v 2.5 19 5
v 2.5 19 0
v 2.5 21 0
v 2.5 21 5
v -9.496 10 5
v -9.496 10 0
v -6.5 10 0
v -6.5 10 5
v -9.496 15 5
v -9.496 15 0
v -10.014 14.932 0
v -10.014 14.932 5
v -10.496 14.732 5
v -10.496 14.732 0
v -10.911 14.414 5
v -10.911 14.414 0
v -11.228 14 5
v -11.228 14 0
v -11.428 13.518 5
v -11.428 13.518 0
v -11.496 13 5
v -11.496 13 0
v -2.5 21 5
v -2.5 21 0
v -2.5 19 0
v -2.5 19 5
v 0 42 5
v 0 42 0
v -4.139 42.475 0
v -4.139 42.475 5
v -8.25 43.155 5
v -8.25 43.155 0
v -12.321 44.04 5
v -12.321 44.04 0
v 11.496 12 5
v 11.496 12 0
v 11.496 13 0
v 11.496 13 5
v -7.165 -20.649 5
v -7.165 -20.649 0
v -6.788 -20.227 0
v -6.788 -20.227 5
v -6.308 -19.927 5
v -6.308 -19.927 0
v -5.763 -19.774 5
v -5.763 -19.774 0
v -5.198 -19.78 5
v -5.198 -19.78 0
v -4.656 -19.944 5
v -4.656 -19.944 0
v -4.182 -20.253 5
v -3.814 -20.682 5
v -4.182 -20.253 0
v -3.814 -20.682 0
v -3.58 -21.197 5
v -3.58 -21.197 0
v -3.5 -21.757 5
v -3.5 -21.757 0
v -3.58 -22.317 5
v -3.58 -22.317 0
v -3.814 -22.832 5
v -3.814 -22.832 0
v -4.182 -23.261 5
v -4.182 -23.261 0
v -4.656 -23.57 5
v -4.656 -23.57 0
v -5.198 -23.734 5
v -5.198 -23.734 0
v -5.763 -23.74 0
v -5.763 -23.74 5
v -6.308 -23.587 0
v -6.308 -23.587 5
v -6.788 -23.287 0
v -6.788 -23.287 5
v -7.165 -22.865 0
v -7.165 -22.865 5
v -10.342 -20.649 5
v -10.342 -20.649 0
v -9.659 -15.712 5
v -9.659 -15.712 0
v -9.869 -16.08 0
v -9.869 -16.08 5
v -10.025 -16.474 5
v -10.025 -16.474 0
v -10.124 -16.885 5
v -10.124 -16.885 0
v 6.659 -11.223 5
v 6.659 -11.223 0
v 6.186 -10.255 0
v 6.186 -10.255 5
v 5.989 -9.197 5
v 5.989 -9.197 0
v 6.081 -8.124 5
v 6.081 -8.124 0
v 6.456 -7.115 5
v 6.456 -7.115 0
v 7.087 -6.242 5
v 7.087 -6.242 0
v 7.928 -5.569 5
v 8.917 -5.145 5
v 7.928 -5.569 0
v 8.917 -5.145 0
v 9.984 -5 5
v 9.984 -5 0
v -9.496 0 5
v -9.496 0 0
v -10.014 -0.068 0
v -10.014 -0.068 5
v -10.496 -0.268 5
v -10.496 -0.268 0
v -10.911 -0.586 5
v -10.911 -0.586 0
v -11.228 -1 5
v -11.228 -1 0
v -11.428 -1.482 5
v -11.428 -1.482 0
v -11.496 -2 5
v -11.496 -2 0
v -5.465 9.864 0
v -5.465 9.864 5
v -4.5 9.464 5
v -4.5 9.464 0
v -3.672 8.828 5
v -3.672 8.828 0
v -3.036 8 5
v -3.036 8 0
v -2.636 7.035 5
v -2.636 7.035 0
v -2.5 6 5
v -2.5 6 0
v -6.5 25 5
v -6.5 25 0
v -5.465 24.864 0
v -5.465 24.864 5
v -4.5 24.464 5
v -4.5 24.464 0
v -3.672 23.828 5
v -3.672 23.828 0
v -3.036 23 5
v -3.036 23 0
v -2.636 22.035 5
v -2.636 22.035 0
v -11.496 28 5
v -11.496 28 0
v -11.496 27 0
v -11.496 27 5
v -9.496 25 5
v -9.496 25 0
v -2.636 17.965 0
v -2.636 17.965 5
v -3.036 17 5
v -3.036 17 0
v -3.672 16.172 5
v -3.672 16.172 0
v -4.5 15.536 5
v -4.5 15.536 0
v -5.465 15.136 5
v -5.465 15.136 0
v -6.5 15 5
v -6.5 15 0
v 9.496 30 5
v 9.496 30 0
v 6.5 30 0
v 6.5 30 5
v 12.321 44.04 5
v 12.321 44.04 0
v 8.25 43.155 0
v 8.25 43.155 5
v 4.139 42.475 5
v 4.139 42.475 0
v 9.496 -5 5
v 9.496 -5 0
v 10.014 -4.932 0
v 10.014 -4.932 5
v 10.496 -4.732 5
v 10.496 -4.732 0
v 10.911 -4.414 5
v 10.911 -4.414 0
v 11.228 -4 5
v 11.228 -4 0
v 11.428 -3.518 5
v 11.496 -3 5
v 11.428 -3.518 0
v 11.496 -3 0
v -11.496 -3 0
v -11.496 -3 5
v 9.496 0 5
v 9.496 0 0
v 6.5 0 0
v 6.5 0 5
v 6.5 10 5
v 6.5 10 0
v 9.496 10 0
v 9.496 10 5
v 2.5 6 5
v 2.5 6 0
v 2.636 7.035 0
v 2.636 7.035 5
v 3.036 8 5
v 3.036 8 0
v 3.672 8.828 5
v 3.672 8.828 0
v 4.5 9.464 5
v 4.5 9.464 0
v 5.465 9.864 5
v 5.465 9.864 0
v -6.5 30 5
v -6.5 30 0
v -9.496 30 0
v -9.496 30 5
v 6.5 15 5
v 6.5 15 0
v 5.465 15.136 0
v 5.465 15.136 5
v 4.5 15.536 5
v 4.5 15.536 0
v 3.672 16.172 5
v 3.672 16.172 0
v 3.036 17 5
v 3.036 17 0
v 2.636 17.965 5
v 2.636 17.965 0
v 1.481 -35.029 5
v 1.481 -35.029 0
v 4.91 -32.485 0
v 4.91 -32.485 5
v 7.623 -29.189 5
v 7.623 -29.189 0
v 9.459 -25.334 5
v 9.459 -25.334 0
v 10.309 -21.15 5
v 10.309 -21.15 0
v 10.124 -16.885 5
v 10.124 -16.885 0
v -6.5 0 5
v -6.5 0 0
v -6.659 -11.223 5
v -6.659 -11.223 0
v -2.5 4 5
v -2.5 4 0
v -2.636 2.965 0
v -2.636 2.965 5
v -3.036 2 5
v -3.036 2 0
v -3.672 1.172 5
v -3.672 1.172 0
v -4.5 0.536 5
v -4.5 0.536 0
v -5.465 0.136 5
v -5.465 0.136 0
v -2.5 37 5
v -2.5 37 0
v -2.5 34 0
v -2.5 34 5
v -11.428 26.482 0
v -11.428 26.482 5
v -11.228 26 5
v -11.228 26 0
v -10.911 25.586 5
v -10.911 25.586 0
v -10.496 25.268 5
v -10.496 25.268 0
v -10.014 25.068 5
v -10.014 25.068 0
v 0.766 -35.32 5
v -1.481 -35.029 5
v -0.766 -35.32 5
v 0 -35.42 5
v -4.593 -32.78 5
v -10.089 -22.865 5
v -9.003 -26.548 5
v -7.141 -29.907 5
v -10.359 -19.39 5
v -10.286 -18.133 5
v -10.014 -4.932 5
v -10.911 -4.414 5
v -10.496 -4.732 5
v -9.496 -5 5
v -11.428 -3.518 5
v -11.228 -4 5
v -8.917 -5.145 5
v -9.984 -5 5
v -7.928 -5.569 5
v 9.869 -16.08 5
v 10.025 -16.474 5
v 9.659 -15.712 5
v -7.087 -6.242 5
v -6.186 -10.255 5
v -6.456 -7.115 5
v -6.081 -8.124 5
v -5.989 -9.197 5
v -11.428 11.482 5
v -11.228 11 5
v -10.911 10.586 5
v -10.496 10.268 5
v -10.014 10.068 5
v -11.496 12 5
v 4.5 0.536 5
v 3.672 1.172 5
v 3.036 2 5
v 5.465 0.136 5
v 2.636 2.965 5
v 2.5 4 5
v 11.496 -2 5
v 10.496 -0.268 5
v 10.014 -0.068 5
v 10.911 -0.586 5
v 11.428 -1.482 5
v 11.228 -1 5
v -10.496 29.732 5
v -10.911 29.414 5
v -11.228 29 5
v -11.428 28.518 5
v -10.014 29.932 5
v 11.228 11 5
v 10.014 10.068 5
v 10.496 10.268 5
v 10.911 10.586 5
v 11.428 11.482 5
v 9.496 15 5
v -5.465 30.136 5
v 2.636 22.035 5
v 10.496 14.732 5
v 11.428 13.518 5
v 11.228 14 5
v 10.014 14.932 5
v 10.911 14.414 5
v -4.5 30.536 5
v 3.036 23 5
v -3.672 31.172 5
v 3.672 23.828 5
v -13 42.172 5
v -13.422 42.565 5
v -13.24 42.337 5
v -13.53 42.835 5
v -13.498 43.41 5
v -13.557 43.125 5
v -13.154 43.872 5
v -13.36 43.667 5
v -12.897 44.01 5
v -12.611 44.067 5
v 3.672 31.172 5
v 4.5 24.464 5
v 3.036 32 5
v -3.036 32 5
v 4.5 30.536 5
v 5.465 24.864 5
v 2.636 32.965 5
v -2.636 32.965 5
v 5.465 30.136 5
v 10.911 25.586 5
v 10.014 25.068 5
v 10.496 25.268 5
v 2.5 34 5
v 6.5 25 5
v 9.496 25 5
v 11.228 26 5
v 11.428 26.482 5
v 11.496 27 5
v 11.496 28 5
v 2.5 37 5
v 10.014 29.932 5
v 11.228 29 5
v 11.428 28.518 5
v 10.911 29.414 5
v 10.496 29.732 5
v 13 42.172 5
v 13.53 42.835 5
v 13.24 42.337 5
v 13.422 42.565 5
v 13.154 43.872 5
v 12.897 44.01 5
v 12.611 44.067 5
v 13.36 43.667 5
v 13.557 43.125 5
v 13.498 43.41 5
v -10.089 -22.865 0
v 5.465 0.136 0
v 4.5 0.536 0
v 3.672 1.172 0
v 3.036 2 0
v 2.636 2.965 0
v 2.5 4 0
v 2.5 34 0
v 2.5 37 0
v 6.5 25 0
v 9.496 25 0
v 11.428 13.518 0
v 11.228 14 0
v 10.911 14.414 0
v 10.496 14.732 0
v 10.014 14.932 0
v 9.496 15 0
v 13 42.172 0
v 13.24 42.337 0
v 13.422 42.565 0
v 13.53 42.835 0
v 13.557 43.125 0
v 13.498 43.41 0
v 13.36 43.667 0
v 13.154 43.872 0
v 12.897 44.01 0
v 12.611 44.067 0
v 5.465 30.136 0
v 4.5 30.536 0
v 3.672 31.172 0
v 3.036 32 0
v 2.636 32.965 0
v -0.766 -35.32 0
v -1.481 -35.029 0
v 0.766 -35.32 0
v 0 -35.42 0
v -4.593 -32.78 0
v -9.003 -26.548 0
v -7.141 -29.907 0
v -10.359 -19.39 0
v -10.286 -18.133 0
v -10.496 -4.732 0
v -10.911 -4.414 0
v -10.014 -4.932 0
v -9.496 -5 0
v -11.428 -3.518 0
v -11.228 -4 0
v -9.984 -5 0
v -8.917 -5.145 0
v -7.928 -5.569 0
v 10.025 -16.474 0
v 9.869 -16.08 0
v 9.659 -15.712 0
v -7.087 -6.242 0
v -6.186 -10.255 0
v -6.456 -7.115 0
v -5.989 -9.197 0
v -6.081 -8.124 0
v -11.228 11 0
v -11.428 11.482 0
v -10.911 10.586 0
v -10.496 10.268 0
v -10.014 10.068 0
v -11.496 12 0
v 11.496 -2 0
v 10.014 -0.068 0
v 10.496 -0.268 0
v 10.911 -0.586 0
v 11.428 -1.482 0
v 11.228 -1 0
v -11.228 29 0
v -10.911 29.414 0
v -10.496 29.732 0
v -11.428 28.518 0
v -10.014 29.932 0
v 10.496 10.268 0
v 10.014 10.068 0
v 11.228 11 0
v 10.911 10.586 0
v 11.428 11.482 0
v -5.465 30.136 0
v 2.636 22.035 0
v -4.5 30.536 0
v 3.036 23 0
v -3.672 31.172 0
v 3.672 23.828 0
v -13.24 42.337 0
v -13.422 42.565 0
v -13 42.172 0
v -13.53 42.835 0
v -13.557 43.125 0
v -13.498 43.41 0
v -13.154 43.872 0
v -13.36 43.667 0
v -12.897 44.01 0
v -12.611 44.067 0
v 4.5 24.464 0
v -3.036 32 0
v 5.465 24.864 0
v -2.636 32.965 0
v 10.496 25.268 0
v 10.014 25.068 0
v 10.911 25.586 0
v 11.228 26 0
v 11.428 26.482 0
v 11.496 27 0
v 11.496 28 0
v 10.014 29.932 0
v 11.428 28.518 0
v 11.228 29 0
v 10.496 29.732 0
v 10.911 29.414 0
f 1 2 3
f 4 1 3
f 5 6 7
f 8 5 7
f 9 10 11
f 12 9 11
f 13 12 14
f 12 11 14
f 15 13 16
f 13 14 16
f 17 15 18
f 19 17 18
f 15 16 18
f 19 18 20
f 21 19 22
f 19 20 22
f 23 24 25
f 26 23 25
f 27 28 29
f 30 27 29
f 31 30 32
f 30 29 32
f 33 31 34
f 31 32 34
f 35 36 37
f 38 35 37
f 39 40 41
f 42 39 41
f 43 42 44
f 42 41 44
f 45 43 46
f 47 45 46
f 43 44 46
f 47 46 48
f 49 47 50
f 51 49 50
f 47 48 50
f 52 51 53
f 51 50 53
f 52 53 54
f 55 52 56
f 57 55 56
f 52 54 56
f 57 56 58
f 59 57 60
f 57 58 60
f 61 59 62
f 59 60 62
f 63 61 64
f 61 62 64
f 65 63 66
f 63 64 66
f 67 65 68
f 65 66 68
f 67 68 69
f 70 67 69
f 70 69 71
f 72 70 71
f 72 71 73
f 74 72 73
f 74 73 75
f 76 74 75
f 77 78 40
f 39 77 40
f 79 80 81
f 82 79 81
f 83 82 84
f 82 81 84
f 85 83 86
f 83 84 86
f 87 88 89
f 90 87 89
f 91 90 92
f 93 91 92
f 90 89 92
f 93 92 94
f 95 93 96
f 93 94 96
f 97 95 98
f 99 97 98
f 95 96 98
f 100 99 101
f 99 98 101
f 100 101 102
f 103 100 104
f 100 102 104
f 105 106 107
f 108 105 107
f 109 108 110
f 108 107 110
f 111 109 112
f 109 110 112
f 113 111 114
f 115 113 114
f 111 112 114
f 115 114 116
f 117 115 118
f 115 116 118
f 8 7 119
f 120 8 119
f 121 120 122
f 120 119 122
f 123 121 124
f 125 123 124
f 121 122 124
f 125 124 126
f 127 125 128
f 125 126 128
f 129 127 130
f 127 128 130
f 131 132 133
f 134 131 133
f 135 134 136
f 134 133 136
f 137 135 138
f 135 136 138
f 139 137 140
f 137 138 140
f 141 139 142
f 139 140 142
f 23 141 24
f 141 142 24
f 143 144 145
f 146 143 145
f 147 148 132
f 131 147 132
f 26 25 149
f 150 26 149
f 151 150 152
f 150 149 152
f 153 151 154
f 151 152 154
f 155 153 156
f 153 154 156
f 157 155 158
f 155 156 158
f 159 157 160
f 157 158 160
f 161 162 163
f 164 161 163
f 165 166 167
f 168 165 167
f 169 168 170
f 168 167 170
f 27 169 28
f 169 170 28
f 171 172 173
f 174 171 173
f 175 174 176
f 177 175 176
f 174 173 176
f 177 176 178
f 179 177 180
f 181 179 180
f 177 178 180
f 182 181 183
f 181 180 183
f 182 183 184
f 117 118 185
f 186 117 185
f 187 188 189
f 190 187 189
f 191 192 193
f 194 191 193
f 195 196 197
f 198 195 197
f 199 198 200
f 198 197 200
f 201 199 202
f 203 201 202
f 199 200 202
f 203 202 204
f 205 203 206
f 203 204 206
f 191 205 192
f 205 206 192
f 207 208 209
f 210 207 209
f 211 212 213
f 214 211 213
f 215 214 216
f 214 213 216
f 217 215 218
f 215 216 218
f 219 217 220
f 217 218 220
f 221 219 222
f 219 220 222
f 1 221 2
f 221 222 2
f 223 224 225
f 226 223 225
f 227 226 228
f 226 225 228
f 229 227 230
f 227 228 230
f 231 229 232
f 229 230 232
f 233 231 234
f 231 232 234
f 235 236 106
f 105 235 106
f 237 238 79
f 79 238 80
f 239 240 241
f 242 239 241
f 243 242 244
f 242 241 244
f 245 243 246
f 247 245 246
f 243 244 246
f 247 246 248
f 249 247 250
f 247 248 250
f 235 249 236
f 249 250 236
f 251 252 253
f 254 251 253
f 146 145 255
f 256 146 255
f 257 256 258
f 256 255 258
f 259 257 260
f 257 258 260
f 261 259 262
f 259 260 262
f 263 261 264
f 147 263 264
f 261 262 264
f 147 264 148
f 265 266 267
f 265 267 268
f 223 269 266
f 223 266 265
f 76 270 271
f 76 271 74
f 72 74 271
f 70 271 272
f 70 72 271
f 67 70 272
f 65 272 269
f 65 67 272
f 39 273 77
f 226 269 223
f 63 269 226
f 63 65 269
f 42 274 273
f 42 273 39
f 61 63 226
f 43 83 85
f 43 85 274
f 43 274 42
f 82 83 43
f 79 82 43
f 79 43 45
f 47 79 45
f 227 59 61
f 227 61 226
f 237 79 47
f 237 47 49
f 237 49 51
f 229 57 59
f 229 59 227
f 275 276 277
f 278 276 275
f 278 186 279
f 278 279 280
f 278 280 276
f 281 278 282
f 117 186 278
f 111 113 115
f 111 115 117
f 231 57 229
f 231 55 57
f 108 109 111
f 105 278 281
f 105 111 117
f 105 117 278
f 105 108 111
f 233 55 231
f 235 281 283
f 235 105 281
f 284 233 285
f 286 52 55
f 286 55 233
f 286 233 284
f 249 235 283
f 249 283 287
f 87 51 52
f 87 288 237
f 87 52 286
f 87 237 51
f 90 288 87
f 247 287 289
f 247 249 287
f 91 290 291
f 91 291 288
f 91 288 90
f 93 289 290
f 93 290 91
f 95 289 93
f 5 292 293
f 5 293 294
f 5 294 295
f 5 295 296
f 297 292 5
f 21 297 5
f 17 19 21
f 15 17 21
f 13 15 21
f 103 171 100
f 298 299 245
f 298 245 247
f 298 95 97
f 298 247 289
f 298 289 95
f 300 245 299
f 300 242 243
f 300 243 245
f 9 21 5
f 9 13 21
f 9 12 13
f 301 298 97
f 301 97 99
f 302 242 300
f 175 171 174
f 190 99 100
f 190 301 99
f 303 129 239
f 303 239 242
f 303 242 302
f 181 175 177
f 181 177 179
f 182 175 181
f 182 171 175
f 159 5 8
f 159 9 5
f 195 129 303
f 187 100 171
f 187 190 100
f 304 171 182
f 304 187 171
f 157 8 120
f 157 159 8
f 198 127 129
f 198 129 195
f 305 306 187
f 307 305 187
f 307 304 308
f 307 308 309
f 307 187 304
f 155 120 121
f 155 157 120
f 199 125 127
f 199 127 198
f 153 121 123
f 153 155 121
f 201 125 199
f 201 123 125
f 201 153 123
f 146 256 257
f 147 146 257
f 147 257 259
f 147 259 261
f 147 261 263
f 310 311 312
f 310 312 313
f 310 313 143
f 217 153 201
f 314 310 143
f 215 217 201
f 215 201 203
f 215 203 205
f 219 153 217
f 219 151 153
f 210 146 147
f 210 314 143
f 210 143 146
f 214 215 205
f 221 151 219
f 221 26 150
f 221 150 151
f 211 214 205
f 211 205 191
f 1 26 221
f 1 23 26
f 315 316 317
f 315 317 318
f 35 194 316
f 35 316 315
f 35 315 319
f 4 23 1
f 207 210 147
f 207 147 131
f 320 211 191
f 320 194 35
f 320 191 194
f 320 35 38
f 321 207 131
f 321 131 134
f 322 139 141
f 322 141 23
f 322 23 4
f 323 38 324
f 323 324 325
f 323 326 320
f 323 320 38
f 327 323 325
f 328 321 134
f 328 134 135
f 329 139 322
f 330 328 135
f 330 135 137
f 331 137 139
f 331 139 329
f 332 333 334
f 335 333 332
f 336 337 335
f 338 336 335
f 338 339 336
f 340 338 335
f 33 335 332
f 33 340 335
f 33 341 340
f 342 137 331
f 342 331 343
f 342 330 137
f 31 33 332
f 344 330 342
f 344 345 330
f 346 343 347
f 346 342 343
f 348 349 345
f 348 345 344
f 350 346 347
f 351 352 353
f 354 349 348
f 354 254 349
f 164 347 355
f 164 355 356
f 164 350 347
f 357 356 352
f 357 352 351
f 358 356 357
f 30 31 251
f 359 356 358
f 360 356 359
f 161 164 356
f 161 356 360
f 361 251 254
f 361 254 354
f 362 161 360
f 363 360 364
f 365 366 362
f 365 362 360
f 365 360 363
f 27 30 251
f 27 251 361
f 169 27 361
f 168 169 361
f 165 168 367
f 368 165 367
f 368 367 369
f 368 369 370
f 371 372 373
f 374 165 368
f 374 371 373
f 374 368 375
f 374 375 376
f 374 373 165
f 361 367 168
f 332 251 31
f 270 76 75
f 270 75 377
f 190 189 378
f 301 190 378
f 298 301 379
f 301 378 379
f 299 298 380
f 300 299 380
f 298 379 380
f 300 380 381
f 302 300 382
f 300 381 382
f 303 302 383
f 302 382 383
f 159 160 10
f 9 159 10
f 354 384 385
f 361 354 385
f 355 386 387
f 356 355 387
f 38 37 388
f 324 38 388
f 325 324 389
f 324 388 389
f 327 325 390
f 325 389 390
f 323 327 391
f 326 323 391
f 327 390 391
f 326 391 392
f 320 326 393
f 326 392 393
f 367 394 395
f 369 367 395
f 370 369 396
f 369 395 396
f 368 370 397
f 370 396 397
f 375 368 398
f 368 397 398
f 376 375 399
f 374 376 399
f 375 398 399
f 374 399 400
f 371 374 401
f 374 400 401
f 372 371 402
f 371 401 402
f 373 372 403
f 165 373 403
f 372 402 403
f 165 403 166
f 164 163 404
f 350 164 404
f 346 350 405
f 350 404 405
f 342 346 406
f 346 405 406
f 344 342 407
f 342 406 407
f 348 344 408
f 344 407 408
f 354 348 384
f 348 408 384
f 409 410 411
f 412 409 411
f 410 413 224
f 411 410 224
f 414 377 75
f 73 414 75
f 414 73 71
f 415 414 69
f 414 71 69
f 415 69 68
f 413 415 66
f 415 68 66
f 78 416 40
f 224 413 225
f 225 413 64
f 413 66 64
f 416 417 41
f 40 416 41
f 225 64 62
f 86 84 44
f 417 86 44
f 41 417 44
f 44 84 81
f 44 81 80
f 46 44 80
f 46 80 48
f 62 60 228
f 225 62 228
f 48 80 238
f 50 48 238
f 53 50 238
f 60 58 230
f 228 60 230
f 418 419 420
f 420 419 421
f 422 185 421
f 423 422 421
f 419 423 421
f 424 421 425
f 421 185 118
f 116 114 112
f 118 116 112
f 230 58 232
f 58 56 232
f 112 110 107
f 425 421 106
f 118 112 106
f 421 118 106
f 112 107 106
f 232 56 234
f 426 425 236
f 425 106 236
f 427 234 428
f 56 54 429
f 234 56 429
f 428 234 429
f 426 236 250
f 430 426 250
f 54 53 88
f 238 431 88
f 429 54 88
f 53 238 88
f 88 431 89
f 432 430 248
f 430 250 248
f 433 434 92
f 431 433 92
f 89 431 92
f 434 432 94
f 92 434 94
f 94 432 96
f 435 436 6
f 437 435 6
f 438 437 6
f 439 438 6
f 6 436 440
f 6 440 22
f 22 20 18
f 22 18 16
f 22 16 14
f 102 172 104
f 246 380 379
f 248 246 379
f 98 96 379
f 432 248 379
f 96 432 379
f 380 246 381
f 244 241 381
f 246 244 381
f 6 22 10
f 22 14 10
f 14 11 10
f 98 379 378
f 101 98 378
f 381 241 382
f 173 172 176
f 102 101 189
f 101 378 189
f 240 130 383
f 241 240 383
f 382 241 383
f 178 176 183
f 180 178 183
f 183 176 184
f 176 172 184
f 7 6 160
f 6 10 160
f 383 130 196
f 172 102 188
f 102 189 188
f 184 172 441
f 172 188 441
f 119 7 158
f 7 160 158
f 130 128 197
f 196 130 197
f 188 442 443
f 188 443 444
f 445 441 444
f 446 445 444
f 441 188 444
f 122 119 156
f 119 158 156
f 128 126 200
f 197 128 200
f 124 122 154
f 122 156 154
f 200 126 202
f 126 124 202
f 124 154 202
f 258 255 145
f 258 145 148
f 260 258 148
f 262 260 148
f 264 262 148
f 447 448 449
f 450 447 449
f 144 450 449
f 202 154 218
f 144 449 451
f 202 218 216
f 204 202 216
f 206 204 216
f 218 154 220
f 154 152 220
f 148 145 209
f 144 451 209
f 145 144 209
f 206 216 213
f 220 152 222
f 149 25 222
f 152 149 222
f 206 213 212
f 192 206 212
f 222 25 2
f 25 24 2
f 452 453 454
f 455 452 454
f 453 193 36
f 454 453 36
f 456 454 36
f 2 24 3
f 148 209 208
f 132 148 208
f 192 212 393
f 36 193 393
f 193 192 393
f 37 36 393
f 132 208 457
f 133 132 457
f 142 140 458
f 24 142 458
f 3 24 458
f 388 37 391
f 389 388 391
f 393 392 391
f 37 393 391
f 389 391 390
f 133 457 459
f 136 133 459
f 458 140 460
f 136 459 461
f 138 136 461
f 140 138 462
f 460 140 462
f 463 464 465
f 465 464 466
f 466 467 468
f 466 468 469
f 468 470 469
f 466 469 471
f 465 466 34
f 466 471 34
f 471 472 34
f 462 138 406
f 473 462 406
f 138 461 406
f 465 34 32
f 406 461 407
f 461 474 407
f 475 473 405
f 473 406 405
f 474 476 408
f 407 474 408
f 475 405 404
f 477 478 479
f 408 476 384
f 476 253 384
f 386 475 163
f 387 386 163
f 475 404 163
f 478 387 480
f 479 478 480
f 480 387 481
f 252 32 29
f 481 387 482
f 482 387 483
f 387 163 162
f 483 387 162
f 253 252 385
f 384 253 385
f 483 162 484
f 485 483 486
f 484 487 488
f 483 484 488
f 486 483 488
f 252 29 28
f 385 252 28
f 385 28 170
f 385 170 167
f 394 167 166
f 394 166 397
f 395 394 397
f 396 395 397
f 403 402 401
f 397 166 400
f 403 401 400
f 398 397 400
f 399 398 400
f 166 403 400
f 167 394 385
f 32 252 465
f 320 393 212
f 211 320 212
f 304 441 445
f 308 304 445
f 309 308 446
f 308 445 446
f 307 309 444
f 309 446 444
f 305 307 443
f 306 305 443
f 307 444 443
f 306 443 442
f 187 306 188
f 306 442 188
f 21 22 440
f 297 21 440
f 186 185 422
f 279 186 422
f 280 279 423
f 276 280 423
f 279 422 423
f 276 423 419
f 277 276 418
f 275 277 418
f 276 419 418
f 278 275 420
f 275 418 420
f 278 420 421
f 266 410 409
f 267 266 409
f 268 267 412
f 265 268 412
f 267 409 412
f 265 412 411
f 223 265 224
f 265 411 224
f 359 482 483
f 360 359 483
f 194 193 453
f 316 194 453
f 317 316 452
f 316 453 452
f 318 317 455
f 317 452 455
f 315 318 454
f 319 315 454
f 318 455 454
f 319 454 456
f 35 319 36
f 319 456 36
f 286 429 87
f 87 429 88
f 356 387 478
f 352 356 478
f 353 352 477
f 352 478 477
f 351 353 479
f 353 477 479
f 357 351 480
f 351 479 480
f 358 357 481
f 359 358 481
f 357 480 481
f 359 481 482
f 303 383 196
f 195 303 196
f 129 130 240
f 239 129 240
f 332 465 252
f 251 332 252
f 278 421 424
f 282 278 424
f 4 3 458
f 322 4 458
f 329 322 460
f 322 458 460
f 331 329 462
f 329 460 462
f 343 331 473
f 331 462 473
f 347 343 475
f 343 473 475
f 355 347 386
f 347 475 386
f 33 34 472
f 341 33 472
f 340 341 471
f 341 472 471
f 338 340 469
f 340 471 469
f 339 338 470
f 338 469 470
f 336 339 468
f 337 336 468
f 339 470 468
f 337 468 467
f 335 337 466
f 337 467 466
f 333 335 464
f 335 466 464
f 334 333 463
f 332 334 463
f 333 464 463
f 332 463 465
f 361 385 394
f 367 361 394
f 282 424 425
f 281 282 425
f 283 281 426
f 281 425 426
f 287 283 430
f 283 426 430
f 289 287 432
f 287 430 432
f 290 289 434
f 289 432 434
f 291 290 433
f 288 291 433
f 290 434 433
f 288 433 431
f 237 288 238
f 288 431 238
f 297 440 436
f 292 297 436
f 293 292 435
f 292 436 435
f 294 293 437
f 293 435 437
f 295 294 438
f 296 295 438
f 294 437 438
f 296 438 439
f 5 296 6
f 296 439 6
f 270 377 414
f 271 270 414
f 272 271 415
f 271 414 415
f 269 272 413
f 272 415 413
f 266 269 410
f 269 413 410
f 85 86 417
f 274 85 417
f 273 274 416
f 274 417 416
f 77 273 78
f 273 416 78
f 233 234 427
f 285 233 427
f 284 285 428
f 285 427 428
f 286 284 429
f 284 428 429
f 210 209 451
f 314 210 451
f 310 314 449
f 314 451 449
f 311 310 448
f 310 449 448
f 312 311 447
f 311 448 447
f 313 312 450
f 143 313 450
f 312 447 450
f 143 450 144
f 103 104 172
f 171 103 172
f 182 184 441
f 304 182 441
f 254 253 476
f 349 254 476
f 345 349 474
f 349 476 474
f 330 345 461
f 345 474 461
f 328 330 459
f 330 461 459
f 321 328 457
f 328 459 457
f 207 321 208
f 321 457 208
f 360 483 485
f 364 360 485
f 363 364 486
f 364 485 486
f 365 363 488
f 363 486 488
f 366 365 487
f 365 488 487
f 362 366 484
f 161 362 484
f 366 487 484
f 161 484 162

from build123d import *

# Parameters (mm, degrees)
F1_DEPTH = 5


with BuildPart() as f1:
    # F0 (on Top) → F1 (new body)
    with BuildSketch(Plane.XY):
        with BuildLine():
            Line((-6.658514, -11.222553), (-9.659046, -15.71237))
            ThreePointArc((-9.659046, -15.71237), (-9.953746, -16.27401), (-10.123783, -16.885054))
            ThreePointArc((-10.123783, -16.885054), (-10.334123, -18.760982), (-10.341643, -20.64865))
            Line((-10.341643, -20.64865), (-7.164773, -20.64865))
            ThreePointArc((-7.164773, -20.64865), (-3.5, -21.75704), (-7.164773, -22.865431))
            Line((-7.164773, -22.865431), (-10.088952, -22.865431))
            ThreePointArc((-10.088952, -22.865431), (-7.140782, -29.906834), (-1.480678, -35.028971))
            ThreePointArc((-1.480678, -35.028971), (0, -35.419834), (1.480678, -35.028971))
            ThreePointArc((1.480678, -35.028971), (8.658585, -27.317676), (10.123783, -16.885054))
            ThreePointArc((10.123783, -16.885054), (9.953746, -16.27401), (9.659046, -15.71237))
            Line((9.659046, -15.71237), (6.658514, -11.222553))
            ThreePointArc((6.658514, -11.222553), (6.456449, -7.114558), (9.984211, -5))
            Line((9.984211, -5), (9.496351, -5))
            ThreePointArc((9.496351, -5), (10.910565, -4.414214), (11.496351, -3))
            Line((11.496351, -3), (11.496351, -2))
            ThreePointArc((11.496351, -2), (10.910565, -0.585786), (9.496351, 0))
            Line((9.496351, 0), (6.5, 0))
            ThreePointArc((6.5, 0), (3.671573, 1.171573), (2.5, 4))
            Line((2.5, 4), (2.5, 6))
            ThreePointArc((2.5, 6), (3.671573, 8.828427), (6.5, 10))
            Line((6.5, 10), (9.496351, 10))
            ThreePointArc((9.496351, 10), (10.910565, 10.585786), (11.496351, 12))
            Line((11.496351, 12), (11.496351, 13))
            ThreePointArc((11.496351, 13), (10.910565, 14.414214), (9.496351, 15))
            Line((9.496351, 15), (6.5, 15))
            ThreePointArc((6.5, 15), (3.671573, 16.171573), (2.5, 19))
            Line((2.5, 19), (2.5, 21))
            ThreePointArc((2.5, 21), (3.671573, 23.828427), (6.5, 25))
            Line((6.5, 25), (9.496351, 25))
            ThreePointArc((9.496351, 25), (10.910565, 25.585786), (11.496351, 27))
            Line((11.496351, 27), (11.496351, 28))
            ThreePointArc((11.496351, 28), (10.910565, 29.414214), (9.496351, 30))
            Line((9.496351, 30), (6.5, 30))
            ThreePointArc((6.5, 30), (3.671573, 31.171573), (2.5, 34))
            Line((2.5, 34), (2.5, 37))
            Line((2.5, 37), (13, 42.171836))
            ThreePointArc((13, 42.171836), (13.498078, 43.410256), (12.321401, 44.040492))
            ThreePointArc((12.321401, 44.040492), (6.198921, 42.789454), (0, 42))
            ThreePointArc((0, 42), (-6.198921, 42.789454), (-12.321401, 44.040492))
            ThreePointArc((-12.321401, 44.040492), (-13.498078, 43.410256), (-13, 42.171836))
            Line((-13, 42.171836), (-2.5, 37))
            Line((-2.5, 37), (-2.5, 34))
            ThreePointArc((-2.5, 34), (-3.671573, 31.171573), (-6.5, 30))
            Line((-6.5, 30), (-9.496351, 30))
            ThreePointArc((-9.496351, 30), (-10.910565, 29.414214), (-11.496351, 28))
            Line((-11.496351, 28), (-11.496351, 27))
            ThreePointArc((-11.496351, 27), (-10.910565, 25.585786), (-9.496351, 25))
            Line((-9.496351, 25), (-6.5, 25))
            ThreePointArc((-6.5, 25), (-3.671573, 23.828427), (-2.5, 21))
            Line((-2.5, 21), (-2.5, 19))
            ThreePointArc((-2.5, 19), (-3.671573, 16.171573), (-6.5, 15))
            Line((-6.5, 15), (-9.496351, 15))
            ThreePointArc((-9.496351, 15), (-10.910565, 14.414214), (-11.496351, 13))
            Line((-11.496351, 13), (-11.496351, 12))
            ThreePointArc((-11.496351, 12), (-10.910565, 10.585786), (-9.496351, 10))
            Line((-9.496351, 10), (-6.5, 10))
            ThreePointArc((-6.5, 10), (-3.671573, 8.828427), (-2.5, 6))
            Line((-2.5, 6), (-2.5, 4))
            ThreePointArc((-2.5, 4), (-3.671573, 1.171573), (-6.5, 0))
            Line((-6.5, 0), (-9.496351, 0))
            ThreePointArc((-9.496351, 0), (-10.910565, -0.585786), (-11.496351, -2))
            Line((-11.496351, -2), (-11.496351, -3))
            ThreePointArc((-11.496351, -3), (-10.910565, -4.414214), (-9.496351, -5))
            Line((-9.496351, -5), (-9.984211, -5))
            ThreePointArc((-9.984211, -5), (-6.456449, -7.114558), (-6.658514, -11.222553))
        make_face()
    extrude(amount=F1_DEPTH)


solid = f1.part
